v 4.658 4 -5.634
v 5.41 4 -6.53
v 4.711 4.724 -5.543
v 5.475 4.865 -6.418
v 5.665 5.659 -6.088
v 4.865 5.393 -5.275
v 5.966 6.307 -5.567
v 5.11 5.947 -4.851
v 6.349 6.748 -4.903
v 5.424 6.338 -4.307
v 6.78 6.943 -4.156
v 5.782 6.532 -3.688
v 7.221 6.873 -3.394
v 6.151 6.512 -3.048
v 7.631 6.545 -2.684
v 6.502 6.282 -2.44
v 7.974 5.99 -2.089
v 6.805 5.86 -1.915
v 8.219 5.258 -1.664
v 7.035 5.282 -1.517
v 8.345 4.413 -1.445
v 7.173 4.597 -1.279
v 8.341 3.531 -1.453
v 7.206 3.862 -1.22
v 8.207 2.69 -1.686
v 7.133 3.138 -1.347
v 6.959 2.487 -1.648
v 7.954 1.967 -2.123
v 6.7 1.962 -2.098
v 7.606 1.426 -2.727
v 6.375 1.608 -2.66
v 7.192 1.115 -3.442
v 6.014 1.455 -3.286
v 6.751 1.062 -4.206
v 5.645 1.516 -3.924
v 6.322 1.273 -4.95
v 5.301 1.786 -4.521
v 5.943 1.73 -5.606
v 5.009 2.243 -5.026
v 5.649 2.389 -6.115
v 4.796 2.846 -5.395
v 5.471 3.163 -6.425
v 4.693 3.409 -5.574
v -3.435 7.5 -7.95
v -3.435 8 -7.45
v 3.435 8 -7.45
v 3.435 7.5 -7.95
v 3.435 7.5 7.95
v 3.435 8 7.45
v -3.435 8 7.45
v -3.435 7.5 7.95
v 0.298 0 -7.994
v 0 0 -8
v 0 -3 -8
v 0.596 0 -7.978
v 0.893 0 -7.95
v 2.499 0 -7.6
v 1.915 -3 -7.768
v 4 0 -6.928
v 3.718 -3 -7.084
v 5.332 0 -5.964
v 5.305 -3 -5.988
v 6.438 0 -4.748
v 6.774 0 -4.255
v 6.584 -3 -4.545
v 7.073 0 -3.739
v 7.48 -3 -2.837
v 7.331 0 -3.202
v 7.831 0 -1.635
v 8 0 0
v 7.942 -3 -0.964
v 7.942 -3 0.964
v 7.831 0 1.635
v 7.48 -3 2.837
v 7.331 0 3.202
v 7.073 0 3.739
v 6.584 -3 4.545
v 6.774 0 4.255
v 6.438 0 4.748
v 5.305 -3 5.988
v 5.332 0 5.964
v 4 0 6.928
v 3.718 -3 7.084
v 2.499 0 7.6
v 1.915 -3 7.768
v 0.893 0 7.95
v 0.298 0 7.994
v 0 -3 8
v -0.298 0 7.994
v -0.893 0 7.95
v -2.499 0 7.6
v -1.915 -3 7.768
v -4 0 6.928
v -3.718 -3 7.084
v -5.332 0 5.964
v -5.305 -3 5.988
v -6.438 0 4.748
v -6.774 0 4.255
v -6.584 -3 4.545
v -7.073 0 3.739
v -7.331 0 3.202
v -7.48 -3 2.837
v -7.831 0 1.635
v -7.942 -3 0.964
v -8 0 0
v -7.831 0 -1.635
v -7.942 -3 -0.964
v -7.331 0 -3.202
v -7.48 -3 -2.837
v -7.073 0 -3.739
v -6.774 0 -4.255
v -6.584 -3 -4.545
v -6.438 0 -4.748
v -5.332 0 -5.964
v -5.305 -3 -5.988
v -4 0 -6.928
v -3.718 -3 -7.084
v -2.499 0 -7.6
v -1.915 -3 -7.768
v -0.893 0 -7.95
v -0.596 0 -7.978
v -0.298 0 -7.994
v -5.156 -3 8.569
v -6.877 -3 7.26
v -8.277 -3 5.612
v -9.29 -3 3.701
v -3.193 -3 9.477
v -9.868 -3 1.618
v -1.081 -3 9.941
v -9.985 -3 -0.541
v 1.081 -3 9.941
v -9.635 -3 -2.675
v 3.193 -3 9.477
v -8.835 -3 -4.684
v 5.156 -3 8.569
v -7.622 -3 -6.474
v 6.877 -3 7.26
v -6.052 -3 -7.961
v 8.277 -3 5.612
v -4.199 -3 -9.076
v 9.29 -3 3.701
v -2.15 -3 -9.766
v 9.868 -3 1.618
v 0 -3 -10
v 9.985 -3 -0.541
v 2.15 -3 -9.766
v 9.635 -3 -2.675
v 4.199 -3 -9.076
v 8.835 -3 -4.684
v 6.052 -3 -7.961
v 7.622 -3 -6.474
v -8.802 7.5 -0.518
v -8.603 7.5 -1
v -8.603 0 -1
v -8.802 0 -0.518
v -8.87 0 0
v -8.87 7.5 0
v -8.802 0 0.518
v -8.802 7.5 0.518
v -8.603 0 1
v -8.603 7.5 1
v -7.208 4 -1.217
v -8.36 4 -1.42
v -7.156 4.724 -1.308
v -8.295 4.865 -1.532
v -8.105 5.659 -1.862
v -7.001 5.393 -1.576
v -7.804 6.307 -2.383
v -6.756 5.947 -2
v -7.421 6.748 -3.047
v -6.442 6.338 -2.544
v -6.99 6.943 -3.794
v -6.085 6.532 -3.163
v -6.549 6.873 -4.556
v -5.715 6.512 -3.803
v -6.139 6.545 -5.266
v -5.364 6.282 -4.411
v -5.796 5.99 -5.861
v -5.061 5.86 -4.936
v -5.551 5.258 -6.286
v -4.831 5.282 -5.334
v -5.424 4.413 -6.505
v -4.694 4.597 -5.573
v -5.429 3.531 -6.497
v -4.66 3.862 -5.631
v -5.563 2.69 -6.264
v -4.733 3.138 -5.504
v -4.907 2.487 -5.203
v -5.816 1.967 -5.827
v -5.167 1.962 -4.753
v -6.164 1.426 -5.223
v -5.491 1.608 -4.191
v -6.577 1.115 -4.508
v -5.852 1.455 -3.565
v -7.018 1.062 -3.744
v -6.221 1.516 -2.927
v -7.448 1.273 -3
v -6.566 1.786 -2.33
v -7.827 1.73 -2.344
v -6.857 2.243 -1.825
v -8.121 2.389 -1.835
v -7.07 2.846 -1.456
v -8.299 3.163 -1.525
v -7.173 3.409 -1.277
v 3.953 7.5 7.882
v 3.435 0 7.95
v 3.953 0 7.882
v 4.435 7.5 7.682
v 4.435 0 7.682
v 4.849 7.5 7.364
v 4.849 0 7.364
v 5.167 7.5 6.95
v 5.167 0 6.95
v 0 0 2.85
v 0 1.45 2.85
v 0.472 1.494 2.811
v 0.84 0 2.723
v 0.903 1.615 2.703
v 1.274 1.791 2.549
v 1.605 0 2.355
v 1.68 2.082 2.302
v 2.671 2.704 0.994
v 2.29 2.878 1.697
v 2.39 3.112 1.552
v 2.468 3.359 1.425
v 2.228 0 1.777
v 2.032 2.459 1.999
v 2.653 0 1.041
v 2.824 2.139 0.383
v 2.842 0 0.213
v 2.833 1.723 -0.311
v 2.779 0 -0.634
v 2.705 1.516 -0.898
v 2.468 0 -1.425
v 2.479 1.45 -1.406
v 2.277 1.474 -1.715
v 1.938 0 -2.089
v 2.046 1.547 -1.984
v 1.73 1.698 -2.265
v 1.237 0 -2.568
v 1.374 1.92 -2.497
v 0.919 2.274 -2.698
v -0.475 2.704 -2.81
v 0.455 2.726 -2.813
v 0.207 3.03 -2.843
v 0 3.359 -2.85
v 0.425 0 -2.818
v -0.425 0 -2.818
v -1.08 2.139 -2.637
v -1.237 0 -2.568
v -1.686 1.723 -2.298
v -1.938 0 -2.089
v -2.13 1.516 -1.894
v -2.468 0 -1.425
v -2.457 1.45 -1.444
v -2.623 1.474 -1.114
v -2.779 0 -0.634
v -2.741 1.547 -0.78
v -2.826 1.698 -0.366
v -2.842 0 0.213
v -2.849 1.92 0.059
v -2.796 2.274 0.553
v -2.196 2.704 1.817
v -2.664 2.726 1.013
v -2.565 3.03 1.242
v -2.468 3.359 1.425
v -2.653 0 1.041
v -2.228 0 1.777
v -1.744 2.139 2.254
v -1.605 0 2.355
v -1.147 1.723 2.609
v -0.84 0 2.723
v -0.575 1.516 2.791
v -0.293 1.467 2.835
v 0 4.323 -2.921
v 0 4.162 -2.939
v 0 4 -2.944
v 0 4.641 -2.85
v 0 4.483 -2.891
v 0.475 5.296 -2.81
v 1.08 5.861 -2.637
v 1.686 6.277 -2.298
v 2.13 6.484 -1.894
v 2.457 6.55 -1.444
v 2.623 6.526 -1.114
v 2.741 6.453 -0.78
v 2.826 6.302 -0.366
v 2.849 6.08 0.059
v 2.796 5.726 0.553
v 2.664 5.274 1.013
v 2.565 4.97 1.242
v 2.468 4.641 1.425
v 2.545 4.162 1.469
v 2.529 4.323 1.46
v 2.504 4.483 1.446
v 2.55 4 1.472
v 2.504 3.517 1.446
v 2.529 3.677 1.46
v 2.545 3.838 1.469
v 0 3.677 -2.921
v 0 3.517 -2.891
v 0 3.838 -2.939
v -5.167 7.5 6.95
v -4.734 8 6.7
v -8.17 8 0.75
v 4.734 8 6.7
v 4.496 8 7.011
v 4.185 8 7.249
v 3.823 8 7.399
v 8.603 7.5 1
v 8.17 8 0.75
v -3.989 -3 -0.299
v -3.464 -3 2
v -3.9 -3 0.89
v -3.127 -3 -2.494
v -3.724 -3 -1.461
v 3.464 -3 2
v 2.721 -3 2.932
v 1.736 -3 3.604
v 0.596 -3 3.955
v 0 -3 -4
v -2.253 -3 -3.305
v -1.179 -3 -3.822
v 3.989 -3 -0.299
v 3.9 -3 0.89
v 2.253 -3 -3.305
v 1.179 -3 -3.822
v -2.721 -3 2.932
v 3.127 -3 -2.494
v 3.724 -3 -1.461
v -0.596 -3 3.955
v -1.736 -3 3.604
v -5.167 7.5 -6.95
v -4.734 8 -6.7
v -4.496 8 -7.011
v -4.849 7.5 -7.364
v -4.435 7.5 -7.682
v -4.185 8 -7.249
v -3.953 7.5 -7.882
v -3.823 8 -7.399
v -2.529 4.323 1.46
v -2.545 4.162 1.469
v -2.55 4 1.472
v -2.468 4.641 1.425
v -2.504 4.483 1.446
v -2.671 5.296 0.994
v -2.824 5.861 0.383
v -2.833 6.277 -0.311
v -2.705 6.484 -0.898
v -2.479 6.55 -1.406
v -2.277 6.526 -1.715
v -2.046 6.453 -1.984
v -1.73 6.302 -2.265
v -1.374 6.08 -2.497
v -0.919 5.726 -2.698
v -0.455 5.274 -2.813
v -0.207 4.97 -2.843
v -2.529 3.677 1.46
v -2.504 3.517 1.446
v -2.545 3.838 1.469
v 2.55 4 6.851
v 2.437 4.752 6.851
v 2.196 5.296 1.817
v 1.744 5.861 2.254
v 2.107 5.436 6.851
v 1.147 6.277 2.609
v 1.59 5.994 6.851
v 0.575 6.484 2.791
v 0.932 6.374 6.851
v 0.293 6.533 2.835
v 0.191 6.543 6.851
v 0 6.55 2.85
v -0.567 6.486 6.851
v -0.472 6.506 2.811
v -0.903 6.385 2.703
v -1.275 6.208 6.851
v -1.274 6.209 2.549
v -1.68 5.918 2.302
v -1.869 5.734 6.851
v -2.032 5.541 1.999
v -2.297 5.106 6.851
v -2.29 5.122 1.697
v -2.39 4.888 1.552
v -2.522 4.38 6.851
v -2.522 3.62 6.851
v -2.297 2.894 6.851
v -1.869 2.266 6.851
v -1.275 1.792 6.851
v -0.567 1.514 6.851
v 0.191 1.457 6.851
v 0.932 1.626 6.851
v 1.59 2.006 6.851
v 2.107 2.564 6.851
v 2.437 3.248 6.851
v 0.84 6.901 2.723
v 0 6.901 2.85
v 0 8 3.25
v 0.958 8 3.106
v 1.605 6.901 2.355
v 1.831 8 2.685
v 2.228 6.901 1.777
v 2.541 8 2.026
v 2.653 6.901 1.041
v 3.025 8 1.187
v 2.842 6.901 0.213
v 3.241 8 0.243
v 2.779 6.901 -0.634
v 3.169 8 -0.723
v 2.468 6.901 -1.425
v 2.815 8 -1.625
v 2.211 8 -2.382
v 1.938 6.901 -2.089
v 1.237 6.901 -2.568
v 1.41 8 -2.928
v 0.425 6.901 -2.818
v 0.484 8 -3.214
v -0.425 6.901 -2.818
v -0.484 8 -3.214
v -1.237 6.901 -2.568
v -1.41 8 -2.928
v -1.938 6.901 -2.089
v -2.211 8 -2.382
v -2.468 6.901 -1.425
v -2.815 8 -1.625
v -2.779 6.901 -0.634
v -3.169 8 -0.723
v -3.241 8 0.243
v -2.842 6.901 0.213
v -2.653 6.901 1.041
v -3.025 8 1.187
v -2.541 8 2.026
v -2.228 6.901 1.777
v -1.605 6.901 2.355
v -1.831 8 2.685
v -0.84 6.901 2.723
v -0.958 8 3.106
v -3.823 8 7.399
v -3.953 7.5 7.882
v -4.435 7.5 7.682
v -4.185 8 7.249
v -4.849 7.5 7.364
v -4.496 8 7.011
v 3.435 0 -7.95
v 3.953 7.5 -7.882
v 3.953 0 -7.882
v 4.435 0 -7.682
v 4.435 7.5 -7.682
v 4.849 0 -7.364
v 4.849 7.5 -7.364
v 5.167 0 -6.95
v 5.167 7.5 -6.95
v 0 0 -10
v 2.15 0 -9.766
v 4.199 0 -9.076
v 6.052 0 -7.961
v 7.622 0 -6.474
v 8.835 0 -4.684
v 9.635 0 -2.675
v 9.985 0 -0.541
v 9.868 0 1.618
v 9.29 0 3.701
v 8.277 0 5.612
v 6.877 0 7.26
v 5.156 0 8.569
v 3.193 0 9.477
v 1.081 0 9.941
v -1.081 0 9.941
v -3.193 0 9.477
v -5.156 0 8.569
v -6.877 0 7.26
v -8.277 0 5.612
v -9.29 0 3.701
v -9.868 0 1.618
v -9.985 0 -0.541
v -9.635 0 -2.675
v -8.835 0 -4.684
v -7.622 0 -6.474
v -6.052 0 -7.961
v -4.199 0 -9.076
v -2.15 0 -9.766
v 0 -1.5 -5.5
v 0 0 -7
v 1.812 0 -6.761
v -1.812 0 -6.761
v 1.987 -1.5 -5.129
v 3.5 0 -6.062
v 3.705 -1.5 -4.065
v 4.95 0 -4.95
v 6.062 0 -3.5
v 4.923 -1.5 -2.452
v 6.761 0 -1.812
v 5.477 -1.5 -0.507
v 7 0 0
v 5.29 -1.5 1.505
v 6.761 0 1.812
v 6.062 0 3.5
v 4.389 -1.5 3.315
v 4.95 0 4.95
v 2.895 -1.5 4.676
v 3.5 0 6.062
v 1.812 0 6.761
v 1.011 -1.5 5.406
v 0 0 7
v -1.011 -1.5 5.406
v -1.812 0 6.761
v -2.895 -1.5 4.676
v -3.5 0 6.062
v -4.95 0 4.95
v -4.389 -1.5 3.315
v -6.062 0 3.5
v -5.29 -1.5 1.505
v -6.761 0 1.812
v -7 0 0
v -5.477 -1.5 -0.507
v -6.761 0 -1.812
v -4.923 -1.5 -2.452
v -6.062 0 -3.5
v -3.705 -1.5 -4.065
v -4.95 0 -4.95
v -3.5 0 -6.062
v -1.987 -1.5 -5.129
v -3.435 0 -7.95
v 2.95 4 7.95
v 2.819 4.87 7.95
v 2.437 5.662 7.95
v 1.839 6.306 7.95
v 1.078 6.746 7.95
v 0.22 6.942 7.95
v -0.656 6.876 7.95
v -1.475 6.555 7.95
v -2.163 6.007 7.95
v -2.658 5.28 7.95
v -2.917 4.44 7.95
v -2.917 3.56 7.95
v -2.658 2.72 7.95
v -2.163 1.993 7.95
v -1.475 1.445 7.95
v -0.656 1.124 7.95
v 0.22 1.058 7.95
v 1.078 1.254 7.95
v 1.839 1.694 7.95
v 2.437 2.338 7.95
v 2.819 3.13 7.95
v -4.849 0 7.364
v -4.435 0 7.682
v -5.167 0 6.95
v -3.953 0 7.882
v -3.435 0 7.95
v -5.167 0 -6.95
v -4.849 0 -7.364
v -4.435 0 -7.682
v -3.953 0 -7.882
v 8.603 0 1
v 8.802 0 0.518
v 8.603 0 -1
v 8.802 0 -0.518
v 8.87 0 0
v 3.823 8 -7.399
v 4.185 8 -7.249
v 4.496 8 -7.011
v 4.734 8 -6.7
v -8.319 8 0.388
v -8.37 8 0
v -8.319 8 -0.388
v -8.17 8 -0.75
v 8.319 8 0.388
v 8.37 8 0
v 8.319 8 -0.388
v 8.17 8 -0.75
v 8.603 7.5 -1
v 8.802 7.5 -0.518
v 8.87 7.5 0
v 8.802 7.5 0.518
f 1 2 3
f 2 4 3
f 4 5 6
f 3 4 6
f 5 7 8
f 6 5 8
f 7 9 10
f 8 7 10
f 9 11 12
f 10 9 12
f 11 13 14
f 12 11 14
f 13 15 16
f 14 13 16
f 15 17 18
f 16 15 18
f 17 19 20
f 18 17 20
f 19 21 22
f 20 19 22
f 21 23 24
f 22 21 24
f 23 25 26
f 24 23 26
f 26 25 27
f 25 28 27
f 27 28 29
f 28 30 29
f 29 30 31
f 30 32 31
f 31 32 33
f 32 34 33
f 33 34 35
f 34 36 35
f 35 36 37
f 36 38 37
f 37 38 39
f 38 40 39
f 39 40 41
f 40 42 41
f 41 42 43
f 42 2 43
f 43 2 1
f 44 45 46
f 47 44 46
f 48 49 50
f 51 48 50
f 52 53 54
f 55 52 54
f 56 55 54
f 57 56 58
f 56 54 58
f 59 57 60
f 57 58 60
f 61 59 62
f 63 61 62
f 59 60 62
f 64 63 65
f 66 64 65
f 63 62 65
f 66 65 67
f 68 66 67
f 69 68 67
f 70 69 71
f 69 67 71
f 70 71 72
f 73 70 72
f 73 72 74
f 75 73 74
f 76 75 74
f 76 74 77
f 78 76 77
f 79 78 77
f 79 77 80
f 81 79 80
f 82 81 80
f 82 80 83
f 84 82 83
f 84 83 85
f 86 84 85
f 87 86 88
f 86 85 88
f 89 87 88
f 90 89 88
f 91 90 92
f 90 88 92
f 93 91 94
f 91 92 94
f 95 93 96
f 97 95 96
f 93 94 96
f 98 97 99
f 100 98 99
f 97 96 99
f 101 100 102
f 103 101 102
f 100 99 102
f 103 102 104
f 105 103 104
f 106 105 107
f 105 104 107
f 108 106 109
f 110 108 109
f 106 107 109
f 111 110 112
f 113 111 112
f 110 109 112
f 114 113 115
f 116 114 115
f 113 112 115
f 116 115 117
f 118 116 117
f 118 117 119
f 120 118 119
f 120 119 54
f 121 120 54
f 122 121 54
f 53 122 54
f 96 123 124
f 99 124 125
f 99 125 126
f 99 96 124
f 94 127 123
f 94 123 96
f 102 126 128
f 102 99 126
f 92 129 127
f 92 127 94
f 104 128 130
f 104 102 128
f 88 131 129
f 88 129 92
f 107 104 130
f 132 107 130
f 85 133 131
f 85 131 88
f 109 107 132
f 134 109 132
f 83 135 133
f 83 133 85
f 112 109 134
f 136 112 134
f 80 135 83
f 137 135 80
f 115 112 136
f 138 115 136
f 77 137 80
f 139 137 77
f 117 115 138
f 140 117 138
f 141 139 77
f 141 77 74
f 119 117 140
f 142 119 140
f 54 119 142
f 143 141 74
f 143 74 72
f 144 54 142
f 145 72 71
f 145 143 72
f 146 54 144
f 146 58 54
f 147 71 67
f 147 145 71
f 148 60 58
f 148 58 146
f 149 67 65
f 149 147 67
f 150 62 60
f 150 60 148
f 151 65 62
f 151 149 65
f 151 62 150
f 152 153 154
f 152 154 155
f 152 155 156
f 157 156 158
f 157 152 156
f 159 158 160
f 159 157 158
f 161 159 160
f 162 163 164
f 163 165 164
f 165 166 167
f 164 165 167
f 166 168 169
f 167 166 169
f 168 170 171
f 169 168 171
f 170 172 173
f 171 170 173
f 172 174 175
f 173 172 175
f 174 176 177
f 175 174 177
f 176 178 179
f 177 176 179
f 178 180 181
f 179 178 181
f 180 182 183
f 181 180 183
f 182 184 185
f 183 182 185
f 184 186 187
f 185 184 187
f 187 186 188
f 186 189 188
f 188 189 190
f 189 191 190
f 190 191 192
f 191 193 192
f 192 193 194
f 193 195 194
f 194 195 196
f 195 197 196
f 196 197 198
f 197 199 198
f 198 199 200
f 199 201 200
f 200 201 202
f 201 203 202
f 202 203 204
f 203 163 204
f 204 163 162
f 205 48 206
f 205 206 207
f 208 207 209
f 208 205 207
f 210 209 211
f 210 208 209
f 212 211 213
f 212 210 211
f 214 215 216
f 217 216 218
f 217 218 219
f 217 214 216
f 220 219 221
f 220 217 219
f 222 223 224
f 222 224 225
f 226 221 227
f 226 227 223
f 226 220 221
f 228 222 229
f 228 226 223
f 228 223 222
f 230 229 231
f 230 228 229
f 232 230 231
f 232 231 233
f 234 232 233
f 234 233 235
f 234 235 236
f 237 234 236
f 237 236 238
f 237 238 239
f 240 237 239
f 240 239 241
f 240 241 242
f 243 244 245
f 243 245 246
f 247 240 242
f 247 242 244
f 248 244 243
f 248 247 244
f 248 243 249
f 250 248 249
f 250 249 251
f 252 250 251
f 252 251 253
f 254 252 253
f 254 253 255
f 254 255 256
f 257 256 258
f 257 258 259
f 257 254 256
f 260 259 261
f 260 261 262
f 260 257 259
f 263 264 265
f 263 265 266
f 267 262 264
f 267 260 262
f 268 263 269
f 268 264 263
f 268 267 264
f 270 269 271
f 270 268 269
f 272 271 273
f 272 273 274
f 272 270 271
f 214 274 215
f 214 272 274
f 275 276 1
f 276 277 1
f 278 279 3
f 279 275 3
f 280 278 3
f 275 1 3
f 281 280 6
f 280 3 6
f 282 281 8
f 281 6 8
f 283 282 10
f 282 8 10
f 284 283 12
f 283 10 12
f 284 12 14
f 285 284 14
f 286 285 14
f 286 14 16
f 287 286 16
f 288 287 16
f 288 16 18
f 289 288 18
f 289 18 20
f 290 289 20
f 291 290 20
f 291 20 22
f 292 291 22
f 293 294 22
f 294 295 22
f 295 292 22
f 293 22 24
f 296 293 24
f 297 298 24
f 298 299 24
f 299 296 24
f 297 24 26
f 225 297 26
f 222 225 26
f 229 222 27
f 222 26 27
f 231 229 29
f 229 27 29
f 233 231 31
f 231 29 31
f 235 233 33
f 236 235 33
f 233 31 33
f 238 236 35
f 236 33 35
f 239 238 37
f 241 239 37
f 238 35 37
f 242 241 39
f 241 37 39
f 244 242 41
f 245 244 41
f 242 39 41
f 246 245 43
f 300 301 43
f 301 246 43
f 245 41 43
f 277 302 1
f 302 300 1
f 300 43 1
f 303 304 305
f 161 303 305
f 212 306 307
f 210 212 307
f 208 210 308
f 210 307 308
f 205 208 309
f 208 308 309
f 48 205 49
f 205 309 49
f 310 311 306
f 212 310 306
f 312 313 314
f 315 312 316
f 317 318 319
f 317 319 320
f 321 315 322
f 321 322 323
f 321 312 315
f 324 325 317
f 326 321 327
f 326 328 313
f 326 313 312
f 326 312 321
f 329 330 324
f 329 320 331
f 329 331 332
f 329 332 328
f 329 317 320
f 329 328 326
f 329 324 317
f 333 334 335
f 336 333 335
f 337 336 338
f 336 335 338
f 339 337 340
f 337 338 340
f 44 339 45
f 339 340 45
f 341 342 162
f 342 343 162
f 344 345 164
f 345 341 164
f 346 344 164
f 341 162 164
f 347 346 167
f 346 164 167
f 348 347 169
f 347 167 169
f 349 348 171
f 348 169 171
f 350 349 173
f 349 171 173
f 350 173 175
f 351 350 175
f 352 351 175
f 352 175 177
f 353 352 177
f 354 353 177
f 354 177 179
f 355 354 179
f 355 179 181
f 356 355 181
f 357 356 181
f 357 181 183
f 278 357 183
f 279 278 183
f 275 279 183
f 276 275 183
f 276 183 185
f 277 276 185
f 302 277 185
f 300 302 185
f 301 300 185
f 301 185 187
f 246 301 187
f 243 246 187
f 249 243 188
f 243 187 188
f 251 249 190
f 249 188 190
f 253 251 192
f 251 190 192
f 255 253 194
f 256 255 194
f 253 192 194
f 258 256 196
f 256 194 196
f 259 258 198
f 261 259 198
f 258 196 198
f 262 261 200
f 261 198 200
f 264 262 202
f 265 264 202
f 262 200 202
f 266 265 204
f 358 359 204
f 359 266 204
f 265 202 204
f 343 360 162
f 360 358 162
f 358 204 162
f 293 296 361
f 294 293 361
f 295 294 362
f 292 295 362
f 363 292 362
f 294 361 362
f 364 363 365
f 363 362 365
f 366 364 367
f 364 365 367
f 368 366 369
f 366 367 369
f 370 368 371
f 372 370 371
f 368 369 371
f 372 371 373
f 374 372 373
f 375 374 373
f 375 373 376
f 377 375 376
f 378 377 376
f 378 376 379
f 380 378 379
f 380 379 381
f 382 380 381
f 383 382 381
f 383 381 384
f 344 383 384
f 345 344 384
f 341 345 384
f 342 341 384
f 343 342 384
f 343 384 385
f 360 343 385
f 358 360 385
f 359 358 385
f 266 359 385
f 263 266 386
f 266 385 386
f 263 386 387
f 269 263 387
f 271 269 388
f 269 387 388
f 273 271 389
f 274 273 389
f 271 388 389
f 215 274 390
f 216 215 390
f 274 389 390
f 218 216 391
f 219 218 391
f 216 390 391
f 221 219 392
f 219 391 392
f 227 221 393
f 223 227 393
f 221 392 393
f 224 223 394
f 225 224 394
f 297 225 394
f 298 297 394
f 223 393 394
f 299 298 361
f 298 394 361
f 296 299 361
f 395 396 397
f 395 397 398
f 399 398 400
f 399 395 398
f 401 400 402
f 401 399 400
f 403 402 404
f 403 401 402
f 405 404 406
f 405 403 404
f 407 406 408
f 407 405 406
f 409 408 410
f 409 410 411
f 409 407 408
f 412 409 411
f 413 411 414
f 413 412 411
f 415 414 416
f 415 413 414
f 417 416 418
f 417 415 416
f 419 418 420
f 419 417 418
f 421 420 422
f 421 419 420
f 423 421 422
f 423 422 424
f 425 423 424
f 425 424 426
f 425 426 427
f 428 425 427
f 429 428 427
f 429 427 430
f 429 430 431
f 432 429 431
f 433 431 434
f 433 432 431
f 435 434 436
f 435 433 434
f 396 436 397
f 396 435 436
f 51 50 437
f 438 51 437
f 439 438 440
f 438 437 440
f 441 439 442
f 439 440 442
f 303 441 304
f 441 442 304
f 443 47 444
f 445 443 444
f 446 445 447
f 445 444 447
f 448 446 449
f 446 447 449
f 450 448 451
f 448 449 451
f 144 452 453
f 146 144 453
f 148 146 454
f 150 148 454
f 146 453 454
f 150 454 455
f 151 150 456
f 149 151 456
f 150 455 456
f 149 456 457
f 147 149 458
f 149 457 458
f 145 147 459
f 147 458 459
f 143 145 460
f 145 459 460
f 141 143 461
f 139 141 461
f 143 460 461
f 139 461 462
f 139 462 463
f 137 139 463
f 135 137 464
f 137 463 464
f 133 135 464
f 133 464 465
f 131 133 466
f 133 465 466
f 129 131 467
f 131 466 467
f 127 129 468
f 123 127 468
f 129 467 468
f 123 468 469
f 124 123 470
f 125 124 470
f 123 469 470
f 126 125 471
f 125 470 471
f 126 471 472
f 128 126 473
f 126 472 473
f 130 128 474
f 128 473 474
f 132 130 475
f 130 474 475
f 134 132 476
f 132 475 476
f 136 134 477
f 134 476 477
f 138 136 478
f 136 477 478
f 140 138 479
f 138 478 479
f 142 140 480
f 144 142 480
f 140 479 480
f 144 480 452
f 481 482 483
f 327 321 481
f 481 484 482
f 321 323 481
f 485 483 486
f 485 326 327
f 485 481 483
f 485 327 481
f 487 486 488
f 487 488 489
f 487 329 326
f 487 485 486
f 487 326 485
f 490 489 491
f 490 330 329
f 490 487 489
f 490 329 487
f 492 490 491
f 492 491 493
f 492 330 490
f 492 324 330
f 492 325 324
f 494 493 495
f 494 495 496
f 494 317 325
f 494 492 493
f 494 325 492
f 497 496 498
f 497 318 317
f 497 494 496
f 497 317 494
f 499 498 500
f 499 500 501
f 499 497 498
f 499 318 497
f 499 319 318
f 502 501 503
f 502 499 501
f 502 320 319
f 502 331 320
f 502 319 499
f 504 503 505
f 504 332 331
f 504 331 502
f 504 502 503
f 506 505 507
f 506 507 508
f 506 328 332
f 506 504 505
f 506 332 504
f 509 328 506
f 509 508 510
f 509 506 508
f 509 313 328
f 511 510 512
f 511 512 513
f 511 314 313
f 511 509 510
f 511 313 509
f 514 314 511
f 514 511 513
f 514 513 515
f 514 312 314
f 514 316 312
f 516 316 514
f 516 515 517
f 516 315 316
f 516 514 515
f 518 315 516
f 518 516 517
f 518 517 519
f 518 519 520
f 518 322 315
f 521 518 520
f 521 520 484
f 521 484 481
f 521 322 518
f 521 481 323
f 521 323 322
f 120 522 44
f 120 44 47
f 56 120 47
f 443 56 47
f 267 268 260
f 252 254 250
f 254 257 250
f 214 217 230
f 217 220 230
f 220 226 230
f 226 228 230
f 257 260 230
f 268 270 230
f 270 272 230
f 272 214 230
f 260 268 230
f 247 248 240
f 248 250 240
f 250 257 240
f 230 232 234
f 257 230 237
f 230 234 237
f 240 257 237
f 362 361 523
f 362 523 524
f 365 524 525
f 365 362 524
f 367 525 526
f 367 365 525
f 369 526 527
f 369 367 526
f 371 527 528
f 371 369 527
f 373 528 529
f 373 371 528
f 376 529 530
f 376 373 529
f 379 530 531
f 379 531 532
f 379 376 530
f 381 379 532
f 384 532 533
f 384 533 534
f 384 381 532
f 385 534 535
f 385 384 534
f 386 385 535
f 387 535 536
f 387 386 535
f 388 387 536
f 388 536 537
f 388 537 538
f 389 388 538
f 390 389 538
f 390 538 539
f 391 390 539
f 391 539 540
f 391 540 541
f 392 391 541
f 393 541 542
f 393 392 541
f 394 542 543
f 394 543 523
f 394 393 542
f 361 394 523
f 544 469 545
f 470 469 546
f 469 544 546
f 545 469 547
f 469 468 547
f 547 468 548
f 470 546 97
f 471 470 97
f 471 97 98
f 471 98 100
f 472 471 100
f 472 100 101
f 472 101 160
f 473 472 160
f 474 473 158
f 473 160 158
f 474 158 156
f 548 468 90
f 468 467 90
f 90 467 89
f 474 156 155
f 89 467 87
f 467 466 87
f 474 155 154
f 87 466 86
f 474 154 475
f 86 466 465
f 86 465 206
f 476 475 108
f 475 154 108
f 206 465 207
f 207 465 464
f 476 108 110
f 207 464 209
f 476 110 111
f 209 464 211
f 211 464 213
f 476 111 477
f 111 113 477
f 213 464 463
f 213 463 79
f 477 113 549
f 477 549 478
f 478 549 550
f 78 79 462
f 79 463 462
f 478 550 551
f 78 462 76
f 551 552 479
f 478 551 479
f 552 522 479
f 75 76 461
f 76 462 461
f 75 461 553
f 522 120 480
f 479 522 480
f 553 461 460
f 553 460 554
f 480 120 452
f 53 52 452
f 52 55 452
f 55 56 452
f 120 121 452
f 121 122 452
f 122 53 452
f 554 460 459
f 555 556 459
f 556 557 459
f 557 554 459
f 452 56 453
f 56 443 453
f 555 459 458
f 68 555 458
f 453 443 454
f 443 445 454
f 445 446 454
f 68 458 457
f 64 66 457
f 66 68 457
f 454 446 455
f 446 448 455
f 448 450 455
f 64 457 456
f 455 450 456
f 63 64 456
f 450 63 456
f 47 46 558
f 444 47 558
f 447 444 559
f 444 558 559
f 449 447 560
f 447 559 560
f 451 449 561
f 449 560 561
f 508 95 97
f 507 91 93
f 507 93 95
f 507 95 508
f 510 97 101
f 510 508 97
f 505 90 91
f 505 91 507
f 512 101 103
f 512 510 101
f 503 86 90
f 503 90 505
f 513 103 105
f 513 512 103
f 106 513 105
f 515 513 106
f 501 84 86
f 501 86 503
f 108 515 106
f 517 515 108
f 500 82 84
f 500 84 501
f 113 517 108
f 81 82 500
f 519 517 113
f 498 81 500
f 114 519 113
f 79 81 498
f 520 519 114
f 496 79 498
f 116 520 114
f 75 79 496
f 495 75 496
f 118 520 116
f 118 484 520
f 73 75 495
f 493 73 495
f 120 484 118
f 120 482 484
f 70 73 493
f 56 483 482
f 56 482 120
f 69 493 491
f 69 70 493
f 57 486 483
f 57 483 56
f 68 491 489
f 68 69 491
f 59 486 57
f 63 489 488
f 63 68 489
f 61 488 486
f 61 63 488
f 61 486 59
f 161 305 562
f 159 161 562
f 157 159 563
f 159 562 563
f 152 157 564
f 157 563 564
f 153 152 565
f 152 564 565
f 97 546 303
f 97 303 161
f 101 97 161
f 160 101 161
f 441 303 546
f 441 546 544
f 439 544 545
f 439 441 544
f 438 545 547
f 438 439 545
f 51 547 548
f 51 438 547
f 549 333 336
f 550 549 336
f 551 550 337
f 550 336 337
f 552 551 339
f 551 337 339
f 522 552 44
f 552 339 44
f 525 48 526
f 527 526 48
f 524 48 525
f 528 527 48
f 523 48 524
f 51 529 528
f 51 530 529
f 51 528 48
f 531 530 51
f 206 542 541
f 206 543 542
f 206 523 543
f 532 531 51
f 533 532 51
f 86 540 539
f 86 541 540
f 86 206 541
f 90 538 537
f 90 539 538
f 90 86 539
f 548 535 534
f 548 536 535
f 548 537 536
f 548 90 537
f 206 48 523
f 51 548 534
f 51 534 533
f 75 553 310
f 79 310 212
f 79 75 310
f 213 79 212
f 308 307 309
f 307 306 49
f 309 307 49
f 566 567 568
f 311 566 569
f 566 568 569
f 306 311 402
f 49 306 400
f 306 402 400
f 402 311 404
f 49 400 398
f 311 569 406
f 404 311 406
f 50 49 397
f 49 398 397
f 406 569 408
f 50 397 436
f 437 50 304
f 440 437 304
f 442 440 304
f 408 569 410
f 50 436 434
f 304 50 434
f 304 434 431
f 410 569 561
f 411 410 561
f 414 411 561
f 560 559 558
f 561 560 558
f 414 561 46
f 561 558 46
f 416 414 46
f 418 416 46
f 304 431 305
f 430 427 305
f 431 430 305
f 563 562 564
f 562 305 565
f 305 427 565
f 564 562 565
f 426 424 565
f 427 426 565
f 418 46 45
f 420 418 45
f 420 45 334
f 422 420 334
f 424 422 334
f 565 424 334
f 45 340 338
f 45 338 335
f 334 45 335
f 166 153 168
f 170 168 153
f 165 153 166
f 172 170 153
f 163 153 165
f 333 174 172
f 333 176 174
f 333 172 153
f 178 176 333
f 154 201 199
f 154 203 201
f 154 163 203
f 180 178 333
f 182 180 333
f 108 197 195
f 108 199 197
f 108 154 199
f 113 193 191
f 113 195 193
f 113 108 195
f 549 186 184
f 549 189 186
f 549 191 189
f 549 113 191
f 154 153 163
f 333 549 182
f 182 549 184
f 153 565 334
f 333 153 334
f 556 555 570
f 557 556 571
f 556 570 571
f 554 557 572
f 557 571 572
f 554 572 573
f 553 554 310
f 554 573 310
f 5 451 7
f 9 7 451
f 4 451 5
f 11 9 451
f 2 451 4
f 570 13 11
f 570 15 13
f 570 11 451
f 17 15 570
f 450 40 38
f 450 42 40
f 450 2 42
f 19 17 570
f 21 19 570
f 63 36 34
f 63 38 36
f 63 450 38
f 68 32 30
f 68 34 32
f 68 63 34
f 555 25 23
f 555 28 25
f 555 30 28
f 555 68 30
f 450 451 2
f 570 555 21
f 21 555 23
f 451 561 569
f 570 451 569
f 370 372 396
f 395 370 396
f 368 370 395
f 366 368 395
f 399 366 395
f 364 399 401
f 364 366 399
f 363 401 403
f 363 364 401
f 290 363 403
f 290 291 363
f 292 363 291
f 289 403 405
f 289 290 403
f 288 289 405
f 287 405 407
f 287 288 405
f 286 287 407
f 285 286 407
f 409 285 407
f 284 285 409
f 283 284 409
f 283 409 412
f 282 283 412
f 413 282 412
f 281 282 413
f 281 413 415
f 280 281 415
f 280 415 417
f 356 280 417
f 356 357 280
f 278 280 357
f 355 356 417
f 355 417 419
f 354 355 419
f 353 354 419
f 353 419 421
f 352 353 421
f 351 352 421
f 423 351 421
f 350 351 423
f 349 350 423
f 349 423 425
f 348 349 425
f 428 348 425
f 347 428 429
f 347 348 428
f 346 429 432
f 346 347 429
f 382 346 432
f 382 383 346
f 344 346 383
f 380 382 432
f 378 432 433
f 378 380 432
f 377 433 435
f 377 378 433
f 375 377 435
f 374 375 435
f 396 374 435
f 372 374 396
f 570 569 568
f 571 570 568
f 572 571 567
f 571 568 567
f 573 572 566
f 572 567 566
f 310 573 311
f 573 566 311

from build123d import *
from OCP.BRepFilletAPI import BRepFilletAPI_MakeChamfer

# Parameters (mm, degrees)
SKETCH1_R               = 2.85
BOSS_EXTRUDE1_DEPTH     = 8
CUT_EXTRUDE1_REACH      = 22.027
CUT_EXTRUDE1_END_RADIUS = 2.85
SKETCH2_R               = 2.55
CIRPATTERN1_COUNT       = 3
CHAMFER1_SIZE           = 0.4
CHAMFER1_SIZE2          = 1.098990968
FILLET1_R               = 2
SKETCH3_R               = 10
BOSS_EXTRUDE2_DEPTH     = 3
SKETCH4_R               = 8
SKETCH4_R_2             = 7
CUT_EXTRUDE2_DEPTH      = 3
CHAMFER3_SIZE           = 3
CHAMFER2_SIZE           = 0.5


with BuildPart() as part:
    # Sketch1 → Boss-Extrude1 (new body)
    with BuildSketch(Plane(origin=(0, 0, 0), x_dir=(1, 0, 0), z_dir=(0, 1, 0))):
        Polygon((-4.58993464, 7.95), (4.58993464, 7.95), (9.17986928, 0), (4.58993464, -7.95), (-4.58993464, -7.95), (-9.17986928, 0), align=None)
        with Locations(Location((0, 0, 0), (0, 0, 270))):
            Circle(SKETCH1_R, mode=Mode.SUBTRACT)
    extrude(amount=BOSS_EXTRUDE1_DEPTH)

    # Cut-Extrude1: up to this cylinder (the profile starts outside it)
    cut_extrude1_end = Plane(origin=(0, 4, 0), z_dir=(0, -1, 0)) * Cylinder(CUT_EXTRUDE1_END_RADIUS, 50.754, mode=Mode.PRIVATE)
    # Sketch2 → Cut-Extrude1 (cut, up to the surface)
    with BuildSketch(Plane.XY.offset(7.95), mode=Mode.PRIVATE) as cut_extrude1_sk1:
        with Locations((0, 4)):
            Circle(SKETCH2_R)
    cut_extrude1_tool1 = extrude(cut_extrude1_sk1.sketch, amount=-CUT_EXTRUDE1_REACH, mode=Mode.PRIVATE) - cut_extrude1_end
    cut_extrude1 = cut_extrude1_tool1.solids().sort_by_distance((0, 4, 7.95))[0]
    add(cut_extrude1, mode=Mode.SUBTRACT)

    # CirPattern1: Cut-Extrude1 ×3 about axis
    cirpattern1_axis = Axis((0, 8, 0), (0, -1, 0))
    for i in range(1, CIRPATTERN1_COUNT):
        add(cut_extrude1.rotate(cirpattern1_axis, i * 360 / CIRPATTERN1_COUNT), mode=Mode.SUBTRACT)

    # Chamfer1: one chamfer whose edges measure the first distance from different faces: ONE call of the kernel's chamfer builder (chamfer() names one face for all edges)
    chamfer1_edges_1 = [part.edges().sort_by_distance(p)[0] for p in [
        (0, 8, -2.85),
    ]]
    chamfer1_side_1 = [part.faces().sort_by_distance(p)[0] for p in [
        (0, 8, -7.707123488),
    ]]
    chamfer1_edges_2 = [part.edges().sort_by_distance(p)[0] for p in [
        (-2.55, 4, 7.95),
    ]]
    chamfer1_side_2 = [part.faces().sort_by_distance(p)[0] for p in [
        (4.468168471, 4, 7.95),
    ]]
    chamfer1_edges_3 = [part.edges().sort_by_distance(p)[0] for p in [
        (-5.60990196, 4, -6.18336478),
    ]]
    chamfer1_side_3 = [part.faces().sort_by_distance(p)[0] for p in [
        (-9.118986195, 4, -0.105452596),
    ]]
    chamfer1_edges_4 = [part.edges().sort_by_distance(p)[0] for p in [
        (8.15990196, 4, -1.76663522),
    ]]
    chamfer1_side_4 = [part.faces().sort_by_distance(p)[0] for p in [
        (4.650817725, 4, -7.844547404),
    ]]
    chamfer1 = BRepFilletAPI_MakeChamfer(part.part.solid().wrapped)
    for e in chamfer1_edges_1:
        chamfer1.Add(CHAMFER1_SIZE, CHAMFER1_SIZE2, e.wrapped, chamfer1_side_1[0].wrapped)  # the first distance lies on this face
    for e in chamfer1_edges_2:
        chamfer1.Add(CHAMFER1_SIZE, CHAMFER1_SIZE2, e.wrapped, chamfer1_side_2[0].wrapped)  # the first distance lies on this face
    for e in chamfer1_edges_3:
        chamfer1.Add(CHAMFER1_SIZE, CHAMFER1_SIZE2, e.wrapped, chamfer1_side_3[0].wrapped)  # the first distance lies on this face
    for e in chamfer1_edges_4:
        chamfer1.Add(CHAMFER1_SIZE, CHAMFER1_SIZE2, e.wrapped, chamfer1_side_4[0].wrapped)  # the first distance lies on this face
    add(Compound.cast(chamfer1.Shape()), mode=Mode.REPLACE)

    # Fillet1
    fillet1_edges = [part.edges().sort_by_distance(p)[0] for p in [
        (-4.58993464, 4, 7.95),
        (-9.17986928, 4, 0),
        (-4.58993464, 4, -7.95),
        (4.58993464, 4, -7.95),
        (9.17986928, 4, 0),
        (4.58993464, 4, 7.95),
    ]]
    fillet(fillet1_edges, radius=FILLET1_R)

    # Sketch3 → Boss-Extrude2 (add)
    with BuildSketch(Plane.XZ):
        with Locations(Location((0, 0, 0), (0, 0, 270))):
            Circle(SKETCH3_R)
    extrude(amount=BOSS_EXTRUDE2_DEPTH)

    # Sketch4 → Cut-Extrude2 (cut)
    with BuildSketch(Plane.XZ.offset(3)):
        with Locations(Location((0, 0, 0), (0, 0, 270))):
            Circle(SKETCH4_R)
        with Locations(Location((0, 0, 0), (0, 0, 270))):
            Circle(SKETCH4_R_2, mode=Mode.SUBTRACT)
    extrude(amount=-CUT_EXTRUDE2_DEPTH, mode=Mode.SUBTRACT)

    # Chamfer3
    chamfer3_edges = [part.edges().sort_by_distance(p)[0] for p in [
        (0, -3, 7),
    ]]
    chamfer(chamfer3_edges, length=CHAMFER3_SIZE - 0.0001)  # a hair under: the kernel refuses the full size

    # Chamfer2
    chamfer2_edges = [part.edges().sort_by_distance(p)[0] for p in [
        (-6.88490196, 8, 3.975),
        (-6.88490196, 8, -3.975),
        (0, 8, 7.95),
        (6.88490196, 8, 3.975),
        (6.88490196, 8, -3.975),
        (0, 8, -7.95),
        (4.435234102, 8, -7.682050808),
        (-4.435234102, 8, -7.682050808),
        (8.870468203, 8, 0),
        (4.435234102, 8, 7.682050808),
        (-4.435234102, 8, 7.682050808),
        (-8.870468203, 8, 0),
    ]]
    chamfer(chamfer2_edges, length=CHAMFER2_SIZE)


solid = part.part
